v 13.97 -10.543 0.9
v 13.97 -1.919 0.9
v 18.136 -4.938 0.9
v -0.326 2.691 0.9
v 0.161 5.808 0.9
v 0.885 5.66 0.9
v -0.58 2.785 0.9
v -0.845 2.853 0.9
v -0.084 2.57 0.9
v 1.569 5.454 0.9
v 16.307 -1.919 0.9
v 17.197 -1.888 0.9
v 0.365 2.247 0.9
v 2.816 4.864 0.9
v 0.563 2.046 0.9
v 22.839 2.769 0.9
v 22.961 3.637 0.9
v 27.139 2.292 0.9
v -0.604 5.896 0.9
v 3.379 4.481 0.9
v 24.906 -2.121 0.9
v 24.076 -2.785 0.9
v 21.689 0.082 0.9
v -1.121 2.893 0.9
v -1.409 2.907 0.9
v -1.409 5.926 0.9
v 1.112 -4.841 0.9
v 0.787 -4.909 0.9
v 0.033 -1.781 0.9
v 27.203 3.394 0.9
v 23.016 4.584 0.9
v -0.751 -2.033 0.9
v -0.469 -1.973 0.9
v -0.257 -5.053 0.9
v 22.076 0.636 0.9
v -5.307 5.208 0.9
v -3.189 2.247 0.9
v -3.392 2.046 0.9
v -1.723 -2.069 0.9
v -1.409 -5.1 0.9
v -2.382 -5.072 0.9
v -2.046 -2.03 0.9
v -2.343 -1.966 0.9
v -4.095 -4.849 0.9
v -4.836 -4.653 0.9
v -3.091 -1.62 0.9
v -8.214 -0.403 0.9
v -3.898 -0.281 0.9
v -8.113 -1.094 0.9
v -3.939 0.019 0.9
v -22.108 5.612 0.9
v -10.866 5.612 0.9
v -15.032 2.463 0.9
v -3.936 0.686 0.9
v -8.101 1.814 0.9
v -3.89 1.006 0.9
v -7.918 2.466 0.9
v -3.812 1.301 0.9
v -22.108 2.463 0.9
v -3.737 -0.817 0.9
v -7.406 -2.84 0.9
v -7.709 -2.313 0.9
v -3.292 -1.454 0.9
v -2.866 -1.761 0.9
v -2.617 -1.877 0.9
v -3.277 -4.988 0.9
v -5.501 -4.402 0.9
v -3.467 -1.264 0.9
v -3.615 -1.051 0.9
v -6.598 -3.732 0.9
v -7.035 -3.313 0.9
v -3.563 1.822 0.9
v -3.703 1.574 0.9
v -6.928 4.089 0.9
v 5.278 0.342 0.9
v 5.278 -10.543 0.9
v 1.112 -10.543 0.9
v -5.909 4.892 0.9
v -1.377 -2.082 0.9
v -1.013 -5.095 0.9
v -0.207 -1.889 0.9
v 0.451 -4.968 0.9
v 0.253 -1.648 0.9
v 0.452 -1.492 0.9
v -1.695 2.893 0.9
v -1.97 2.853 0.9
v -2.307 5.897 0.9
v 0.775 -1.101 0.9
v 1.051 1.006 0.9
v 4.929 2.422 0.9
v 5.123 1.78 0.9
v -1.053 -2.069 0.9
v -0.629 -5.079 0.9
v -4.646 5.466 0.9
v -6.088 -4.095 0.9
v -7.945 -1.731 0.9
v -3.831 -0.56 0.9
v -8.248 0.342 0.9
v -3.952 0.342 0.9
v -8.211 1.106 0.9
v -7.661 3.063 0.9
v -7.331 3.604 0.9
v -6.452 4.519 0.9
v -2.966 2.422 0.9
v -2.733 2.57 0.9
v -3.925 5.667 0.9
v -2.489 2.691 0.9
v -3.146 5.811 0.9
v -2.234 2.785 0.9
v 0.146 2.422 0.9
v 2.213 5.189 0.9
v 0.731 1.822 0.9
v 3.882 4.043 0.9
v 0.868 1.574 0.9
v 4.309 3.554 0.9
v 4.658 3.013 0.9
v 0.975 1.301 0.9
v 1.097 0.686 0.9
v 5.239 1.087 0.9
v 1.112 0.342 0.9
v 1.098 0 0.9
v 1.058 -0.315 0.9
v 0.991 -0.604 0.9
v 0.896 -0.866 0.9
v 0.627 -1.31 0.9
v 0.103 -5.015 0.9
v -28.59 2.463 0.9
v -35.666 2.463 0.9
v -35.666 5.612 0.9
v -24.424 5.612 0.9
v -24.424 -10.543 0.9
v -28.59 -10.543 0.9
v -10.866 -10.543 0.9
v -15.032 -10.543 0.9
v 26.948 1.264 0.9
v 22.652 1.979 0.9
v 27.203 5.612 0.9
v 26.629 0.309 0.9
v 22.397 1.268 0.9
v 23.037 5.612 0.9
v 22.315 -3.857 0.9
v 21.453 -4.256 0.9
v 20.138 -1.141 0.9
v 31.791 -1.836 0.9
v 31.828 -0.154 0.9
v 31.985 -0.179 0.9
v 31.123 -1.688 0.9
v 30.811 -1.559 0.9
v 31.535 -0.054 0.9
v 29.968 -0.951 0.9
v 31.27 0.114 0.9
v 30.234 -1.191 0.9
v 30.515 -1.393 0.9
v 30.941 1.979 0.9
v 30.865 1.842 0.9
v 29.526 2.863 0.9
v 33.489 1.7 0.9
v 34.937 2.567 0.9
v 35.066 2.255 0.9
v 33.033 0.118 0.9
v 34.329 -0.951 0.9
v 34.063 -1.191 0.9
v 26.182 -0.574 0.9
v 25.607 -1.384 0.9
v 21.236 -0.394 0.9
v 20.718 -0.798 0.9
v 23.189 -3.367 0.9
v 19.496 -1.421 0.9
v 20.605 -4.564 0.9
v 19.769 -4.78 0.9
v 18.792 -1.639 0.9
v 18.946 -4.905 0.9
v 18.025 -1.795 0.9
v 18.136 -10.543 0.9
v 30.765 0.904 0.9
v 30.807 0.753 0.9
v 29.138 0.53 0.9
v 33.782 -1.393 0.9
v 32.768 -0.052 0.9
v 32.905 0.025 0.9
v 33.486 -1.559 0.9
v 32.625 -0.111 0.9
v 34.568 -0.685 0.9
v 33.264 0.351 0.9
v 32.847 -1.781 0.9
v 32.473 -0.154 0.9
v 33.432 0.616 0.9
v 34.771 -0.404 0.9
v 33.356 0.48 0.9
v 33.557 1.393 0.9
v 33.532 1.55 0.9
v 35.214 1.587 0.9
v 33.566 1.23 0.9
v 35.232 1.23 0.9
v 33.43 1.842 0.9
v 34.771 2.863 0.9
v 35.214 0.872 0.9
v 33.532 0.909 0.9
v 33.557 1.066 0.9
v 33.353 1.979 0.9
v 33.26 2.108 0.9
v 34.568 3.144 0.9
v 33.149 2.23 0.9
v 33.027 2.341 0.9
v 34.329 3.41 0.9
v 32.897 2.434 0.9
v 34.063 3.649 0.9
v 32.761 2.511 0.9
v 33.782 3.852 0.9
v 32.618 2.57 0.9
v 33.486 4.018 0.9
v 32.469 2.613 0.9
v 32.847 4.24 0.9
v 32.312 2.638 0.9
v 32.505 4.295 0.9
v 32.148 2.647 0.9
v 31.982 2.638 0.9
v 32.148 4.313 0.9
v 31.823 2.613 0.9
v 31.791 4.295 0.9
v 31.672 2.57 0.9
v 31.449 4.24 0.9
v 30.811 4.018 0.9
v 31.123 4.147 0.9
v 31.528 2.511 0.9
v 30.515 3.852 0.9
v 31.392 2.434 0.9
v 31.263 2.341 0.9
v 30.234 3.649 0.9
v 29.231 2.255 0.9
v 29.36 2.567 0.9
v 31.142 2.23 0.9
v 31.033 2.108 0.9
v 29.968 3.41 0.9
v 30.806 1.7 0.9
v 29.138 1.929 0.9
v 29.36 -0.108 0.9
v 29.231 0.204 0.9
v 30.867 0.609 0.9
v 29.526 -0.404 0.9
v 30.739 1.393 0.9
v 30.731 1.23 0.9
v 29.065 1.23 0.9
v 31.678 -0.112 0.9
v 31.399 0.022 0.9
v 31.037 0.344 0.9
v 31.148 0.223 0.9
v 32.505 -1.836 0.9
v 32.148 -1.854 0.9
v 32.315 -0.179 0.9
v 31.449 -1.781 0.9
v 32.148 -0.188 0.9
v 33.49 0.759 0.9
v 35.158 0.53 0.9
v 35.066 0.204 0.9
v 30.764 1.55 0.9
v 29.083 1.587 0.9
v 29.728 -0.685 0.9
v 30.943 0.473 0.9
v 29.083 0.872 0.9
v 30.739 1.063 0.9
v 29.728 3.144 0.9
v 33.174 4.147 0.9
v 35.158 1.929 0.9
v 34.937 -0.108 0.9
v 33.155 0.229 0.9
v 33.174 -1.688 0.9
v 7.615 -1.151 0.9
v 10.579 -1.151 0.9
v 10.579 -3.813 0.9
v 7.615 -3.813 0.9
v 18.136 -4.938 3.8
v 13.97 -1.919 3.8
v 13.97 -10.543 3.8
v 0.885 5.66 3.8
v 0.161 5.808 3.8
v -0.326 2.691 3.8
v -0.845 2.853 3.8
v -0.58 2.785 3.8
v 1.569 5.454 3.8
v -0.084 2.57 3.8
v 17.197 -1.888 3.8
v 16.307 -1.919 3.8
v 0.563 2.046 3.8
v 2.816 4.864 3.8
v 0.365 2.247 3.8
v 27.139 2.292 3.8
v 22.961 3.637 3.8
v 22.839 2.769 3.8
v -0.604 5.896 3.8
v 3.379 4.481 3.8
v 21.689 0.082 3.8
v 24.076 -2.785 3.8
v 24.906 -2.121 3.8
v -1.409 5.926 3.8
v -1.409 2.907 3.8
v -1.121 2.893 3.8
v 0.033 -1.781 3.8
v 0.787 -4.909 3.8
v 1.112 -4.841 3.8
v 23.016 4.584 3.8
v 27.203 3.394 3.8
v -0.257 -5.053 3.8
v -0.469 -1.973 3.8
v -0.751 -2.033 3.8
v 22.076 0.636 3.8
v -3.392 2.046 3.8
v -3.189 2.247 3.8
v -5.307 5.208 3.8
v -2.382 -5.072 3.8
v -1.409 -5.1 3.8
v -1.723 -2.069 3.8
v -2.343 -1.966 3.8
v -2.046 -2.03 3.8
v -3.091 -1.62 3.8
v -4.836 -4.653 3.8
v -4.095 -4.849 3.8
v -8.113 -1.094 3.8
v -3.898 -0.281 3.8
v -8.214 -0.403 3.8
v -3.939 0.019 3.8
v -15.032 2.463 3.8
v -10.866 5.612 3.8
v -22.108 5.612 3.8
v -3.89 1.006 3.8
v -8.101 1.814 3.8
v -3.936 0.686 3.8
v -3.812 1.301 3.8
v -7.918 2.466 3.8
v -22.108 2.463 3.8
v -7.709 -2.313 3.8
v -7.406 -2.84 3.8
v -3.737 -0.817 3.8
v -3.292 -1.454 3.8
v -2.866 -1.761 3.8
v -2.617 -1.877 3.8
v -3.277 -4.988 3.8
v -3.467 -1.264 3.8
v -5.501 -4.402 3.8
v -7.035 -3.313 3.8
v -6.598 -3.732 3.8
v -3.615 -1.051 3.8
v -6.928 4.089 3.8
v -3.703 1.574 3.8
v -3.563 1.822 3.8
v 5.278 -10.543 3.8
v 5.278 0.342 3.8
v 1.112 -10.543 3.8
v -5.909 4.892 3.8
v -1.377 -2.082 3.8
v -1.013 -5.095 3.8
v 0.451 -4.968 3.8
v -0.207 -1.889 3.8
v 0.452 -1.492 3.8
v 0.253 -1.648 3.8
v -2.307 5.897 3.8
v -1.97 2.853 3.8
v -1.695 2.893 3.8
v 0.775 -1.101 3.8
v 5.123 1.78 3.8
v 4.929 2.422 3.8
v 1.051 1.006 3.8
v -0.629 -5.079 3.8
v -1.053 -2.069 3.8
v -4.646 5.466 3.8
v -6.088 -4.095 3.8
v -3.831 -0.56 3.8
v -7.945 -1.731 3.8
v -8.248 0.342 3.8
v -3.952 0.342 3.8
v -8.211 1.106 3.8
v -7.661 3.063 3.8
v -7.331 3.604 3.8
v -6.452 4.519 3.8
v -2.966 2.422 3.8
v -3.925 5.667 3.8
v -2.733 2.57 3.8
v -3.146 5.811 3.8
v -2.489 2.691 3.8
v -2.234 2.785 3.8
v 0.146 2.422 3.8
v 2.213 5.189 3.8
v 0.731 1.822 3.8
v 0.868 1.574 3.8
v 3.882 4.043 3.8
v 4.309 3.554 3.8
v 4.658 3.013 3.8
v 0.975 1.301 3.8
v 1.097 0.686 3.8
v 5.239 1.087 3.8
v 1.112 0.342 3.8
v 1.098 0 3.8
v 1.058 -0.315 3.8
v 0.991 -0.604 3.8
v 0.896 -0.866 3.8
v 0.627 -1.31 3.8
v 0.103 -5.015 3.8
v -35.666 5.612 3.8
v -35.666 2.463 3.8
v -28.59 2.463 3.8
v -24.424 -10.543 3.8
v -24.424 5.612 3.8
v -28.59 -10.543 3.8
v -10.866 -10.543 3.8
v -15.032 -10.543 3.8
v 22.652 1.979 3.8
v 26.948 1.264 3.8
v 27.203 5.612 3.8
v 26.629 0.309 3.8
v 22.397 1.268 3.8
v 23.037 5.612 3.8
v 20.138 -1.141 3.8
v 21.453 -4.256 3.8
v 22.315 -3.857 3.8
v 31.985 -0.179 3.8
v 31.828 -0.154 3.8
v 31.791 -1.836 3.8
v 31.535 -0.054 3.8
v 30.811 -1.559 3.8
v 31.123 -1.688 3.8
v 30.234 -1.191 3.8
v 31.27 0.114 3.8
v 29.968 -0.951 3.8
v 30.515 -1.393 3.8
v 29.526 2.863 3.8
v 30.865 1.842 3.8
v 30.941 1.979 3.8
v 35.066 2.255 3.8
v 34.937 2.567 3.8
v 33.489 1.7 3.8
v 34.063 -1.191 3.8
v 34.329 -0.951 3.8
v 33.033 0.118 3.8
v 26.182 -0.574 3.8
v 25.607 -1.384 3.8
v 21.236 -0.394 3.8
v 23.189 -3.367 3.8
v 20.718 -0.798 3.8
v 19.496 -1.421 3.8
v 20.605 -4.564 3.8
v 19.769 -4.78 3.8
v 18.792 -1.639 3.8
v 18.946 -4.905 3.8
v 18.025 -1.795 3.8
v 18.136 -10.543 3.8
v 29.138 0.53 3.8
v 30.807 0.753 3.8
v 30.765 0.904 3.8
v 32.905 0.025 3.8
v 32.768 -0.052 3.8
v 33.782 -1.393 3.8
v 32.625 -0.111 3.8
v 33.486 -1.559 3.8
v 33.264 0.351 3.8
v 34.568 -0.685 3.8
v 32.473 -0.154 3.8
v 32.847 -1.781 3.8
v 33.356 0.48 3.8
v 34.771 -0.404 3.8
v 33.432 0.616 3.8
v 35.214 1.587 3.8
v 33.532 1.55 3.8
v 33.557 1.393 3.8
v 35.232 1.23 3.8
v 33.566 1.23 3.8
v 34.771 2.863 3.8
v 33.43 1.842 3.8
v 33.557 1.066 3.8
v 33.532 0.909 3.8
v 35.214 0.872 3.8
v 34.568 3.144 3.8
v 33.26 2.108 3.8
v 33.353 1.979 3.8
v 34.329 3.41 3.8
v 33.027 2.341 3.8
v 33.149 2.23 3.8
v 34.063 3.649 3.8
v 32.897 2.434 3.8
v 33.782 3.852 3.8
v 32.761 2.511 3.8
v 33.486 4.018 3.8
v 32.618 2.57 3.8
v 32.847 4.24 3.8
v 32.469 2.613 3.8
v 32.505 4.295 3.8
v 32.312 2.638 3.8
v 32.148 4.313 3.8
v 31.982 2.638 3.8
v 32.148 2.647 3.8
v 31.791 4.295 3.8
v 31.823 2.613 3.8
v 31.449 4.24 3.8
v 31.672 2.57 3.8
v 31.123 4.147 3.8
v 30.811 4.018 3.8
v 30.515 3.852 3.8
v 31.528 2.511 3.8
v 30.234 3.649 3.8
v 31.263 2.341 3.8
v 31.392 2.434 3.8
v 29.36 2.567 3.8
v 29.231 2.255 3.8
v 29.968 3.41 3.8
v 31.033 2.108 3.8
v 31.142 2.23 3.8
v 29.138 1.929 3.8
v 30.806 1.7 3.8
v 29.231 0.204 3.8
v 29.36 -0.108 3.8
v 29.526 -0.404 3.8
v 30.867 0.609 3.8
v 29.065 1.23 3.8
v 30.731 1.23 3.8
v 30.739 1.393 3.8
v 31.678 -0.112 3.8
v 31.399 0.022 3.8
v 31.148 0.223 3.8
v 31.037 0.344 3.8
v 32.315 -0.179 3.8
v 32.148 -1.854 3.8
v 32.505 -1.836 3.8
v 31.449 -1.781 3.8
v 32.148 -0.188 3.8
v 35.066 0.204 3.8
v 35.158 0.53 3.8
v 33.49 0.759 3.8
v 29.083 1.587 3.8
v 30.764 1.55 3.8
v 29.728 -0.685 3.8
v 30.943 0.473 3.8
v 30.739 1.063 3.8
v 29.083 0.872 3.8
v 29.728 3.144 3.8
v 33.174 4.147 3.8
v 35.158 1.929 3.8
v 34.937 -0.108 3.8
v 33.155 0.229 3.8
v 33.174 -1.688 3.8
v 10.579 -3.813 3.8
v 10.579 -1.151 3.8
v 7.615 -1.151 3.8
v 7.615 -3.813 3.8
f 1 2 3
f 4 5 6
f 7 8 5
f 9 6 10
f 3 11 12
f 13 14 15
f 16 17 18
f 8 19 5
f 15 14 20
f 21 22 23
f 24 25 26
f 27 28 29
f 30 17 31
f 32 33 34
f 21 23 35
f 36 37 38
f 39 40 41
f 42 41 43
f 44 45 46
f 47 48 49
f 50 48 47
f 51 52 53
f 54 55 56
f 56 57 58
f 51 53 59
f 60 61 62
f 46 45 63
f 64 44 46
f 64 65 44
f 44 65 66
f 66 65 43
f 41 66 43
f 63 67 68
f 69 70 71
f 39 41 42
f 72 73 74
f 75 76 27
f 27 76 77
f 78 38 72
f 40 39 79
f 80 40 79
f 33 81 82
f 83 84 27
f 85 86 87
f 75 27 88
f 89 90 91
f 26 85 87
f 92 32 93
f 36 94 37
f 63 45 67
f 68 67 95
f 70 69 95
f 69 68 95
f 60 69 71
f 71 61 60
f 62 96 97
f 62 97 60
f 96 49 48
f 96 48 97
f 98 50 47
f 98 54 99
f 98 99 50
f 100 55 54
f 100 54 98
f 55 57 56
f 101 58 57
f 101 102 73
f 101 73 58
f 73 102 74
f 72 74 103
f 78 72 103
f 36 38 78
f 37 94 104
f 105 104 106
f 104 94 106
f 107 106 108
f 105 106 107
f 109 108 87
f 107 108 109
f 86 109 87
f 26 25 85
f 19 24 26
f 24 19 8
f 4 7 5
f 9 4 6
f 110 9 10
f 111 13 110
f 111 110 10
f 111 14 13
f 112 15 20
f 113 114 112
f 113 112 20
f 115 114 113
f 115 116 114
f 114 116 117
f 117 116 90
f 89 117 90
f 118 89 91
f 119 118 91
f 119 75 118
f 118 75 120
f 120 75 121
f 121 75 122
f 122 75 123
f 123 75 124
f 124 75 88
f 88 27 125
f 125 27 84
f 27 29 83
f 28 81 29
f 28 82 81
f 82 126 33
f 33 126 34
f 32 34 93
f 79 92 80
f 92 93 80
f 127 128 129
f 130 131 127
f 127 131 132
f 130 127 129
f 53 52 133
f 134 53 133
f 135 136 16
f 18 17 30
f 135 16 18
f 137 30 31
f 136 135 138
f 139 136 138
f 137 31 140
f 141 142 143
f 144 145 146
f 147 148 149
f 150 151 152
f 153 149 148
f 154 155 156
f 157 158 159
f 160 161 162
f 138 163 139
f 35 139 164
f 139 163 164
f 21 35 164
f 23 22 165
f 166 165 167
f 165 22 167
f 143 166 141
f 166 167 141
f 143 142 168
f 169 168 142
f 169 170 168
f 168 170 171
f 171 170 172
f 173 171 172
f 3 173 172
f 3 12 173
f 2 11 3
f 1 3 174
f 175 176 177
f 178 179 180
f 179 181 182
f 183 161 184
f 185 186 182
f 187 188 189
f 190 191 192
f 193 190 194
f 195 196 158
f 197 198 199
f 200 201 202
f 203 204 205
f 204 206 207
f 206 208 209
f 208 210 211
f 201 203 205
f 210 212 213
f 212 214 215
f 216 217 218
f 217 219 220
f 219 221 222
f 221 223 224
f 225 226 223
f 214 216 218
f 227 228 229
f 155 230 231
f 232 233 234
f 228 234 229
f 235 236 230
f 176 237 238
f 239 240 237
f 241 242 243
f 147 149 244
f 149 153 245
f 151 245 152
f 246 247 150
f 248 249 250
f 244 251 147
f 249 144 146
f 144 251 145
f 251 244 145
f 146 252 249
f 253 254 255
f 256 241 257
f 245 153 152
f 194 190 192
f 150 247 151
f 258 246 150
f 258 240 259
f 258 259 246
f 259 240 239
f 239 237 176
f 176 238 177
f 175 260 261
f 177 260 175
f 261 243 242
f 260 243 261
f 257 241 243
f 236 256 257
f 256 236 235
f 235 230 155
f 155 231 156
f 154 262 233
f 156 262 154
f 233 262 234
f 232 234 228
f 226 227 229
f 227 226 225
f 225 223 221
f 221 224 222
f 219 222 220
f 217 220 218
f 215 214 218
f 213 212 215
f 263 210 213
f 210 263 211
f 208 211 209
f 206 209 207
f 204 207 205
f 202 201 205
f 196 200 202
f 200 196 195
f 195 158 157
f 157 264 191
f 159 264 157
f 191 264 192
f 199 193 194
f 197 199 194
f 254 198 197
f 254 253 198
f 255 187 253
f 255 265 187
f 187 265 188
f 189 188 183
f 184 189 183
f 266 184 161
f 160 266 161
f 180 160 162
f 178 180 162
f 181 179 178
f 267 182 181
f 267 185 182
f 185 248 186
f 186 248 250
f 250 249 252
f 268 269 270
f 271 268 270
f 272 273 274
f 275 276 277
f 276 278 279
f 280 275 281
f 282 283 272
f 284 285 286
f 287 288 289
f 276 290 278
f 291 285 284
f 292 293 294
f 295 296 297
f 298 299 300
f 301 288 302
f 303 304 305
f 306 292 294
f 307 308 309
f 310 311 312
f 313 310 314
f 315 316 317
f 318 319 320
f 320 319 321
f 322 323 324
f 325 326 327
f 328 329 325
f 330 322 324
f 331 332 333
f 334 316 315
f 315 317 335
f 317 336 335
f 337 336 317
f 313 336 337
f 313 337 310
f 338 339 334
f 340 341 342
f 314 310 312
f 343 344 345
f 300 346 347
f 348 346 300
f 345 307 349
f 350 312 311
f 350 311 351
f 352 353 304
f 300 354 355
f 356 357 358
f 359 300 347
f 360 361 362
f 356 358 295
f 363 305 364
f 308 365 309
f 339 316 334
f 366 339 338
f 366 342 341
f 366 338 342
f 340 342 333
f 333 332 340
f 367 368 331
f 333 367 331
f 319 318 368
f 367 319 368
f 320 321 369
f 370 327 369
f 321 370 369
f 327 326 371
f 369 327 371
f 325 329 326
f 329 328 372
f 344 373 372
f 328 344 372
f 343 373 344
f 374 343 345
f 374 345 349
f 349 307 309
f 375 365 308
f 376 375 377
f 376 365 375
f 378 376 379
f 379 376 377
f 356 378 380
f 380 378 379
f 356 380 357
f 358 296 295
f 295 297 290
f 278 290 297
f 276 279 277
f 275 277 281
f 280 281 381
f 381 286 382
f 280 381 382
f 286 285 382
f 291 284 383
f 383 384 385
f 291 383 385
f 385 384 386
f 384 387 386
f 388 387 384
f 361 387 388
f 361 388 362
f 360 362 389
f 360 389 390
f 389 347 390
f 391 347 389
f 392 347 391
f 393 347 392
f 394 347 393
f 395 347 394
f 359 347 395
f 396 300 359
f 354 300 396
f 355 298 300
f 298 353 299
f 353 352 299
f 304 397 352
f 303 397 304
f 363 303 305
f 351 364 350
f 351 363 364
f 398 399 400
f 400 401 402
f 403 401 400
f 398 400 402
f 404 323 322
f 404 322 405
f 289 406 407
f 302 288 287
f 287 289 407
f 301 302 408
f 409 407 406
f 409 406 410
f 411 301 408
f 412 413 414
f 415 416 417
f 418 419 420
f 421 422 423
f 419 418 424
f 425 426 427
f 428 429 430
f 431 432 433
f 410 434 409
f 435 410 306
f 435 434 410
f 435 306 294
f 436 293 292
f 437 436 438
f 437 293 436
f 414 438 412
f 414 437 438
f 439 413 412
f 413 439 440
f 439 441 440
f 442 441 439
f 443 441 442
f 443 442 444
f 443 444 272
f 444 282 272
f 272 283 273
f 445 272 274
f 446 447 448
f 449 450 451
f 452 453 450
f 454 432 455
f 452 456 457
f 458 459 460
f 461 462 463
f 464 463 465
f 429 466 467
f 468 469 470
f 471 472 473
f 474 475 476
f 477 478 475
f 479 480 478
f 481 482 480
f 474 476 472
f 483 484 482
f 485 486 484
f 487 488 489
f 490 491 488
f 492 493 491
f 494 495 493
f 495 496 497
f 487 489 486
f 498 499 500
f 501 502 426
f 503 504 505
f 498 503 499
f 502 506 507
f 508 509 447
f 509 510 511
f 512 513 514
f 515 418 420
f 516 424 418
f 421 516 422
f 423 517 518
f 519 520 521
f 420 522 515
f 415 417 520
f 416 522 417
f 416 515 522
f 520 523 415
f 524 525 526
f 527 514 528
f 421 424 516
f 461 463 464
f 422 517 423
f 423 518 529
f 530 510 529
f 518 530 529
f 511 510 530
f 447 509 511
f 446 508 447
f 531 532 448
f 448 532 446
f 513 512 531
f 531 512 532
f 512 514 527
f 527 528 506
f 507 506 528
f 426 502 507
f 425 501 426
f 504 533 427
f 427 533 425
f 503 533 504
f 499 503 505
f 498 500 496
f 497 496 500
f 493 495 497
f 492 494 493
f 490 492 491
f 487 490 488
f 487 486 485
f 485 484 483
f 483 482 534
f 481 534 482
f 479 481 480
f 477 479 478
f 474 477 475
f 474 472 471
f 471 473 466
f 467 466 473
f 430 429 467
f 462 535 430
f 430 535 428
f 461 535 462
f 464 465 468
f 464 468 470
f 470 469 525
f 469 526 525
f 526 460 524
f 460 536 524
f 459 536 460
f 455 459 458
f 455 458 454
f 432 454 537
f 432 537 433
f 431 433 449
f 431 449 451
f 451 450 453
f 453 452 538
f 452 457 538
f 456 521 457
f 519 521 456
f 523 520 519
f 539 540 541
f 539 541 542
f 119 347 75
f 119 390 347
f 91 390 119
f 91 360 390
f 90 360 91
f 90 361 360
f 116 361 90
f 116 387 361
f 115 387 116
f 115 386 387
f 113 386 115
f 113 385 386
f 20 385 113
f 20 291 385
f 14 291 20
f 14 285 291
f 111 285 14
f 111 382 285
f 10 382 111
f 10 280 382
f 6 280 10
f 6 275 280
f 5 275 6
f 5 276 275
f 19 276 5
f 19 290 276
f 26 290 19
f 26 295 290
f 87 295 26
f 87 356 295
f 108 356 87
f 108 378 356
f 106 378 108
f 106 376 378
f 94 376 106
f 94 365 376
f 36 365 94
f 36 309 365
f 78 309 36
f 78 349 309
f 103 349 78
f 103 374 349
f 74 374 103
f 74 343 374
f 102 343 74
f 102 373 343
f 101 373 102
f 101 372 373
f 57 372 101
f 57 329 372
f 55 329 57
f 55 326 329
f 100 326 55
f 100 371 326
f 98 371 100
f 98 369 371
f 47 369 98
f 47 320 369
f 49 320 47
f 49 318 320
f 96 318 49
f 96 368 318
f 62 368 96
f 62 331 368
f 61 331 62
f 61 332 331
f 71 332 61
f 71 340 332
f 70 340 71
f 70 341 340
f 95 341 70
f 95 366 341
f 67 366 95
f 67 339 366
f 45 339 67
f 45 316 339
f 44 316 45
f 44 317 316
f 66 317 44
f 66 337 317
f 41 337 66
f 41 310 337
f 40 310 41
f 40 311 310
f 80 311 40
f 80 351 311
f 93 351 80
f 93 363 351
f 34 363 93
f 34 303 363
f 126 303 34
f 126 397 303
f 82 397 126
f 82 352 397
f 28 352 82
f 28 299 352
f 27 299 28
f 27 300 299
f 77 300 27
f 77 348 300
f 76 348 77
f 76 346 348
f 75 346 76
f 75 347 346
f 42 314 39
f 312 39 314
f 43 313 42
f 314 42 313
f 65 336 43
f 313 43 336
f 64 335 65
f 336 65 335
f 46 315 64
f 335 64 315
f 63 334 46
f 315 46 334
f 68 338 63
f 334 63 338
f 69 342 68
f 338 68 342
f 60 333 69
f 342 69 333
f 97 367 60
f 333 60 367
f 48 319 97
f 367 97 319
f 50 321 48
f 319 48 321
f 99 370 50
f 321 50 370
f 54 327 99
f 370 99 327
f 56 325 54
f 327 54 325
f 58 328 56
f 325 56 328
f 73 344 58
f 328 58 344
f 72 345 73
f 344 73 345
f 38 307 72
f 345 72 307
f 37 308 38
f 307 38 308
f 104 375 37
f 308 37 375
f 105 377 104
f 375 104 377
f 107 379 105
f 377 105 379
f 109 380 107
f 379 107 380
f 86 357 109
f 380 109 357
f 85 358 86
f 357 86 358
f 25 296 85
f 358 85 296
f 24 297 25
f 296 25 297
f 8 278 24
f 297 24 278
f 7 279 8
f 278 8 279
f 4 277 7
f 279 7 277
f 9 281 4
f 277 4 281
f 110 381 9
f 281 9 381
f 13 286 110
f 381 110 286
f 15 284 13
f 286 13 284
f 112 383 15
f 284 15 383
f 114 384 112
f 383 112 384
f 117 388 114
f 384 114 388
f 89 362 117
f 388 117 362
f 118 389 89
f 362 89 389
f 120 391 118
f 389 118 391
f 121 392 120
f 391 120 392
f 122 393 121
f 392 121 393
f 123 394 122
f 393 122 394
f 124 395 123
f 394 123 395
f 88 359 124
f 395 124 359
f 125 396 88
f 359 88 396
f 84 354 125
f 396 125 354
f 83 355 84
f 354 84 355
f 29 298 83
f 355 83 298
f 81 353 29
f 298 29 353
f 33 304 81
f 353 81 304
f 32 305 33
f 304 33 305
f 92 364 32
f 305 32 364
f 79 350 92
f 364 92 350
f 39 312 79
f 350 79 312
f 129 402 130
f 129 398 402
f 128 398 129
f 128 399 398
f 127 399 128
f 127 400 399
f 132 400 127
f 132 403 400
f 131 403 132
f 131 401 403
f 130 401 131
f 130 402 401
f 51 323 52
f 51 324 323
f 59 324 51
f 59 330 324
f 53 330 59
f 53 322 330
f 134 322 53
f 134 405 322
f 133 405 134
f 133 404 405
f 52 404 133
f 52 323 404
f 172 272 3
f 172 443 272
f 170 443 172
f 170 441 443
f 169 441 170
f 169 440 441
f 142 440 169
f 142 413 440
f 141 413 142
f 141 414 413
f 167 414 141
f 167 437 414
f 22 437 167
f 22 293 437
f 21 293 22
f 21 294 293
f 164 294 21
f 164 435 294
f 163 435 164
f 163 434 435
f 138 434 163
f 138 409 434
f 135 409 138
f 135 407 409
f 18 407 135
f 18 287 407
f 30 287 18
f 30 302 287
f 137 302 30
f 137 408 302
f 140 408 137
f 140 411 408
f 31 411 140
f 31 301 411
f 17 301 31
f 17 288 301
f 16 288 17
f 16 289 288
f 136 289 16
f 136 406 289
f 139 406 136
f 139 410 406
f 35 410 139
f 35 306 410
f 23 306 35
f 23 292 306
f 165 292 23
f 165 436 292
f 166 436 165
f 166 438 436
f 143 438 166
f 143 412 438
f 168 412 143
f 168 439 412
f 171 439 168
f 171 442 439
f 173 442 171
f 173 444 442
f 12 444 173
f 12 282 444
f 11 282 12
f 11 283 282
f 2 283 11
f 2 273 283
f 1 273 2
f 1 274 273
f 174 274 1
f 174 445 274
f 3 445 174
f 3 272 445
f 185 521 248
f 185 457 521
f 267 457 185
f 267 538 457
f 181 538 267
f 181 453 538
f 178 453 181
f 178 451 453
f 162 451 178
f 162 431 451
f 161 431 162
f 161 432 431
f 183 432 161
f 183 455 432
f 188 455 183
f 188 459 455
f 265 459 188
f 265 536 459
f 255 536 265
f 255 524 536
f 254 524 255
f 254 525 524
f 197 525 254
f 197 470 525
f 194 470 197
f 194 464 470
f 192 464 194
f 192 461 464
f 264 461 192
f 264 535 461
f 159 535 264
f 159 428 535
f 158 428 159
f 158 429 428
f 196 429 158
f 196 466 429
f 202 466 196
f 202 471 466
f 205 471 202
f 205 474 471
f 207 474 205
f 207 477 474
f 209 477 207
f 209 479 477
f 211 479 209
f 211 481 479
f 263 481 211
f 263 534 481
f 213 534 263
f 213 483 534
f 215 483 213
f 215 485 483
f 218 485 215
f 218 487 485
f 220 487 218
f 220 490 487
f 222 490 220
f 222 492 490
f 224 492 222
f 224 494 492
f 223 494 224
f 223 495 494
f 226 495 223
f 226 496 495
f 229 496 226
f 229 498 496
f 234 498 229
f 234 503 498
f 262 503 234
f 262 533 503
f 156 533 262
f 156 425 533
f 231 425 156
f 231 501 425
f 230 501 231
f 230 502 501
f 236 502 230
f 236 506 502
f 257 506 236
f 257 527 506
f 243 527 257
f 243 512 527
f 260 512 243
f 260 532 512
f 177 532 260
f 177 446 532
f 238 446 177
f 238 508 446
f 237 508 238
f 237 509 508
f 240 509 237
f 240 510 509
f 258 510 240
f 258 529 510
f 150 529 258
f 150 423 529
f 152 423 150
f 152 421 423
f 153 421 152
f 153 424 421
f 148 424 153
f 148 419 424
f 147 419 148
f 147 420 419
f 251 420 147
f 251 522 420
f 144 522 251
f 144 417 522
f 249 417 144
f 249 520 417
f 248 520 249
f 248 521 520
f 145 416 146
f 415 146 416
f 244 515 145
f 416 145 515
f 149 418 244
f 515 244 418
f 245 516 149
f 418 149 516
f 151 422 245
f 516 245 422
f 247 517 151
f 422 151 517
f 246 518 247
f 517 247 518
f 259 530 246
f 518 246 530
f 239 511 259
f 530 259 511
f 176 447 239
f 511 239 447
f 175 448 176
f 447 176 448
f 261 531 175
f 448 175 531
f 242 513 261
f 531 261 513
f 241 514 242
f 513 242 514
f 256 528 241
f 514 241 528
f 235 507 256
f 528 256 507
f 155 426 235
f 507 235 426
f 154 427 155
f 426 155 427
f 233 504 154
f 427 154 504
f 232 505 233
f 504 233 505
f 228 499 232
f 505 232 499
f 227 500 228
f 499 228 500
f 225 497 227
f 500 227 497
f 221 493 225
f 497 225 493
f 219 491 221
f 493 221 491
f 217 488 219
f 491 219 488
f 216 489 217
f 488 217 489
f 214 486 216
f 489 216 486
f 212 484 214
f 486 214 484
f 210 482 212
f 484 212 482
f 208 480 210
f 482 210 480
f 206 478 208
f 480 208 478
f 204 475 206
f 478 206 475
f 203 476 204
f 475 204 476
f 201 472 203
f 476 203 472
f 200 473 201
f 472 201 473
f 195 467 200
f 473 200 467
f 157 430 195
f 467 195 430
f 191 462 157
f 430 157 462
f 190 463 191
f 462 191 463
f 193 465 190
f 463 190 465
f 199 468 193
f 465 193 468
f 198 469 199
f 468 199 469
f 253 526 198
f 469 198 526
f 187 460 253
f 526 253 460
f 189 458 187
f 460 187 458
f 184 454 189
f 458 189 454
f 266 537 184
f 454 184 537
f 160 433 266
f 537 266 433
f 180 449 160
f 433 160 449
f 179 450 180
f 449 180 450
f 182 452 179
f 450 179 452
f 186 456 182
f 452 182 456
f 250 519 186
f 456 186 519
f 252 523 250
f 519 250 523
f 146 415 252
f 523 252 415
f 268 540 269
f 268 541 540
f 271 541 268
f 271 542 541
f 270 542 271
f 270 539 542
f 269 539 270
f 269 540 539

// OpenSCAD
$fn = 48;
  // syllabics (overlaid on icon, tallest)
  translate([0, -2.500, 0.900]) linear_extrude(height=2.900) text("ᒣᒣᑵᓯᐤ", size=15.956, halign="center", valign="center", font="Euphemia UCAS:style=Bold");
